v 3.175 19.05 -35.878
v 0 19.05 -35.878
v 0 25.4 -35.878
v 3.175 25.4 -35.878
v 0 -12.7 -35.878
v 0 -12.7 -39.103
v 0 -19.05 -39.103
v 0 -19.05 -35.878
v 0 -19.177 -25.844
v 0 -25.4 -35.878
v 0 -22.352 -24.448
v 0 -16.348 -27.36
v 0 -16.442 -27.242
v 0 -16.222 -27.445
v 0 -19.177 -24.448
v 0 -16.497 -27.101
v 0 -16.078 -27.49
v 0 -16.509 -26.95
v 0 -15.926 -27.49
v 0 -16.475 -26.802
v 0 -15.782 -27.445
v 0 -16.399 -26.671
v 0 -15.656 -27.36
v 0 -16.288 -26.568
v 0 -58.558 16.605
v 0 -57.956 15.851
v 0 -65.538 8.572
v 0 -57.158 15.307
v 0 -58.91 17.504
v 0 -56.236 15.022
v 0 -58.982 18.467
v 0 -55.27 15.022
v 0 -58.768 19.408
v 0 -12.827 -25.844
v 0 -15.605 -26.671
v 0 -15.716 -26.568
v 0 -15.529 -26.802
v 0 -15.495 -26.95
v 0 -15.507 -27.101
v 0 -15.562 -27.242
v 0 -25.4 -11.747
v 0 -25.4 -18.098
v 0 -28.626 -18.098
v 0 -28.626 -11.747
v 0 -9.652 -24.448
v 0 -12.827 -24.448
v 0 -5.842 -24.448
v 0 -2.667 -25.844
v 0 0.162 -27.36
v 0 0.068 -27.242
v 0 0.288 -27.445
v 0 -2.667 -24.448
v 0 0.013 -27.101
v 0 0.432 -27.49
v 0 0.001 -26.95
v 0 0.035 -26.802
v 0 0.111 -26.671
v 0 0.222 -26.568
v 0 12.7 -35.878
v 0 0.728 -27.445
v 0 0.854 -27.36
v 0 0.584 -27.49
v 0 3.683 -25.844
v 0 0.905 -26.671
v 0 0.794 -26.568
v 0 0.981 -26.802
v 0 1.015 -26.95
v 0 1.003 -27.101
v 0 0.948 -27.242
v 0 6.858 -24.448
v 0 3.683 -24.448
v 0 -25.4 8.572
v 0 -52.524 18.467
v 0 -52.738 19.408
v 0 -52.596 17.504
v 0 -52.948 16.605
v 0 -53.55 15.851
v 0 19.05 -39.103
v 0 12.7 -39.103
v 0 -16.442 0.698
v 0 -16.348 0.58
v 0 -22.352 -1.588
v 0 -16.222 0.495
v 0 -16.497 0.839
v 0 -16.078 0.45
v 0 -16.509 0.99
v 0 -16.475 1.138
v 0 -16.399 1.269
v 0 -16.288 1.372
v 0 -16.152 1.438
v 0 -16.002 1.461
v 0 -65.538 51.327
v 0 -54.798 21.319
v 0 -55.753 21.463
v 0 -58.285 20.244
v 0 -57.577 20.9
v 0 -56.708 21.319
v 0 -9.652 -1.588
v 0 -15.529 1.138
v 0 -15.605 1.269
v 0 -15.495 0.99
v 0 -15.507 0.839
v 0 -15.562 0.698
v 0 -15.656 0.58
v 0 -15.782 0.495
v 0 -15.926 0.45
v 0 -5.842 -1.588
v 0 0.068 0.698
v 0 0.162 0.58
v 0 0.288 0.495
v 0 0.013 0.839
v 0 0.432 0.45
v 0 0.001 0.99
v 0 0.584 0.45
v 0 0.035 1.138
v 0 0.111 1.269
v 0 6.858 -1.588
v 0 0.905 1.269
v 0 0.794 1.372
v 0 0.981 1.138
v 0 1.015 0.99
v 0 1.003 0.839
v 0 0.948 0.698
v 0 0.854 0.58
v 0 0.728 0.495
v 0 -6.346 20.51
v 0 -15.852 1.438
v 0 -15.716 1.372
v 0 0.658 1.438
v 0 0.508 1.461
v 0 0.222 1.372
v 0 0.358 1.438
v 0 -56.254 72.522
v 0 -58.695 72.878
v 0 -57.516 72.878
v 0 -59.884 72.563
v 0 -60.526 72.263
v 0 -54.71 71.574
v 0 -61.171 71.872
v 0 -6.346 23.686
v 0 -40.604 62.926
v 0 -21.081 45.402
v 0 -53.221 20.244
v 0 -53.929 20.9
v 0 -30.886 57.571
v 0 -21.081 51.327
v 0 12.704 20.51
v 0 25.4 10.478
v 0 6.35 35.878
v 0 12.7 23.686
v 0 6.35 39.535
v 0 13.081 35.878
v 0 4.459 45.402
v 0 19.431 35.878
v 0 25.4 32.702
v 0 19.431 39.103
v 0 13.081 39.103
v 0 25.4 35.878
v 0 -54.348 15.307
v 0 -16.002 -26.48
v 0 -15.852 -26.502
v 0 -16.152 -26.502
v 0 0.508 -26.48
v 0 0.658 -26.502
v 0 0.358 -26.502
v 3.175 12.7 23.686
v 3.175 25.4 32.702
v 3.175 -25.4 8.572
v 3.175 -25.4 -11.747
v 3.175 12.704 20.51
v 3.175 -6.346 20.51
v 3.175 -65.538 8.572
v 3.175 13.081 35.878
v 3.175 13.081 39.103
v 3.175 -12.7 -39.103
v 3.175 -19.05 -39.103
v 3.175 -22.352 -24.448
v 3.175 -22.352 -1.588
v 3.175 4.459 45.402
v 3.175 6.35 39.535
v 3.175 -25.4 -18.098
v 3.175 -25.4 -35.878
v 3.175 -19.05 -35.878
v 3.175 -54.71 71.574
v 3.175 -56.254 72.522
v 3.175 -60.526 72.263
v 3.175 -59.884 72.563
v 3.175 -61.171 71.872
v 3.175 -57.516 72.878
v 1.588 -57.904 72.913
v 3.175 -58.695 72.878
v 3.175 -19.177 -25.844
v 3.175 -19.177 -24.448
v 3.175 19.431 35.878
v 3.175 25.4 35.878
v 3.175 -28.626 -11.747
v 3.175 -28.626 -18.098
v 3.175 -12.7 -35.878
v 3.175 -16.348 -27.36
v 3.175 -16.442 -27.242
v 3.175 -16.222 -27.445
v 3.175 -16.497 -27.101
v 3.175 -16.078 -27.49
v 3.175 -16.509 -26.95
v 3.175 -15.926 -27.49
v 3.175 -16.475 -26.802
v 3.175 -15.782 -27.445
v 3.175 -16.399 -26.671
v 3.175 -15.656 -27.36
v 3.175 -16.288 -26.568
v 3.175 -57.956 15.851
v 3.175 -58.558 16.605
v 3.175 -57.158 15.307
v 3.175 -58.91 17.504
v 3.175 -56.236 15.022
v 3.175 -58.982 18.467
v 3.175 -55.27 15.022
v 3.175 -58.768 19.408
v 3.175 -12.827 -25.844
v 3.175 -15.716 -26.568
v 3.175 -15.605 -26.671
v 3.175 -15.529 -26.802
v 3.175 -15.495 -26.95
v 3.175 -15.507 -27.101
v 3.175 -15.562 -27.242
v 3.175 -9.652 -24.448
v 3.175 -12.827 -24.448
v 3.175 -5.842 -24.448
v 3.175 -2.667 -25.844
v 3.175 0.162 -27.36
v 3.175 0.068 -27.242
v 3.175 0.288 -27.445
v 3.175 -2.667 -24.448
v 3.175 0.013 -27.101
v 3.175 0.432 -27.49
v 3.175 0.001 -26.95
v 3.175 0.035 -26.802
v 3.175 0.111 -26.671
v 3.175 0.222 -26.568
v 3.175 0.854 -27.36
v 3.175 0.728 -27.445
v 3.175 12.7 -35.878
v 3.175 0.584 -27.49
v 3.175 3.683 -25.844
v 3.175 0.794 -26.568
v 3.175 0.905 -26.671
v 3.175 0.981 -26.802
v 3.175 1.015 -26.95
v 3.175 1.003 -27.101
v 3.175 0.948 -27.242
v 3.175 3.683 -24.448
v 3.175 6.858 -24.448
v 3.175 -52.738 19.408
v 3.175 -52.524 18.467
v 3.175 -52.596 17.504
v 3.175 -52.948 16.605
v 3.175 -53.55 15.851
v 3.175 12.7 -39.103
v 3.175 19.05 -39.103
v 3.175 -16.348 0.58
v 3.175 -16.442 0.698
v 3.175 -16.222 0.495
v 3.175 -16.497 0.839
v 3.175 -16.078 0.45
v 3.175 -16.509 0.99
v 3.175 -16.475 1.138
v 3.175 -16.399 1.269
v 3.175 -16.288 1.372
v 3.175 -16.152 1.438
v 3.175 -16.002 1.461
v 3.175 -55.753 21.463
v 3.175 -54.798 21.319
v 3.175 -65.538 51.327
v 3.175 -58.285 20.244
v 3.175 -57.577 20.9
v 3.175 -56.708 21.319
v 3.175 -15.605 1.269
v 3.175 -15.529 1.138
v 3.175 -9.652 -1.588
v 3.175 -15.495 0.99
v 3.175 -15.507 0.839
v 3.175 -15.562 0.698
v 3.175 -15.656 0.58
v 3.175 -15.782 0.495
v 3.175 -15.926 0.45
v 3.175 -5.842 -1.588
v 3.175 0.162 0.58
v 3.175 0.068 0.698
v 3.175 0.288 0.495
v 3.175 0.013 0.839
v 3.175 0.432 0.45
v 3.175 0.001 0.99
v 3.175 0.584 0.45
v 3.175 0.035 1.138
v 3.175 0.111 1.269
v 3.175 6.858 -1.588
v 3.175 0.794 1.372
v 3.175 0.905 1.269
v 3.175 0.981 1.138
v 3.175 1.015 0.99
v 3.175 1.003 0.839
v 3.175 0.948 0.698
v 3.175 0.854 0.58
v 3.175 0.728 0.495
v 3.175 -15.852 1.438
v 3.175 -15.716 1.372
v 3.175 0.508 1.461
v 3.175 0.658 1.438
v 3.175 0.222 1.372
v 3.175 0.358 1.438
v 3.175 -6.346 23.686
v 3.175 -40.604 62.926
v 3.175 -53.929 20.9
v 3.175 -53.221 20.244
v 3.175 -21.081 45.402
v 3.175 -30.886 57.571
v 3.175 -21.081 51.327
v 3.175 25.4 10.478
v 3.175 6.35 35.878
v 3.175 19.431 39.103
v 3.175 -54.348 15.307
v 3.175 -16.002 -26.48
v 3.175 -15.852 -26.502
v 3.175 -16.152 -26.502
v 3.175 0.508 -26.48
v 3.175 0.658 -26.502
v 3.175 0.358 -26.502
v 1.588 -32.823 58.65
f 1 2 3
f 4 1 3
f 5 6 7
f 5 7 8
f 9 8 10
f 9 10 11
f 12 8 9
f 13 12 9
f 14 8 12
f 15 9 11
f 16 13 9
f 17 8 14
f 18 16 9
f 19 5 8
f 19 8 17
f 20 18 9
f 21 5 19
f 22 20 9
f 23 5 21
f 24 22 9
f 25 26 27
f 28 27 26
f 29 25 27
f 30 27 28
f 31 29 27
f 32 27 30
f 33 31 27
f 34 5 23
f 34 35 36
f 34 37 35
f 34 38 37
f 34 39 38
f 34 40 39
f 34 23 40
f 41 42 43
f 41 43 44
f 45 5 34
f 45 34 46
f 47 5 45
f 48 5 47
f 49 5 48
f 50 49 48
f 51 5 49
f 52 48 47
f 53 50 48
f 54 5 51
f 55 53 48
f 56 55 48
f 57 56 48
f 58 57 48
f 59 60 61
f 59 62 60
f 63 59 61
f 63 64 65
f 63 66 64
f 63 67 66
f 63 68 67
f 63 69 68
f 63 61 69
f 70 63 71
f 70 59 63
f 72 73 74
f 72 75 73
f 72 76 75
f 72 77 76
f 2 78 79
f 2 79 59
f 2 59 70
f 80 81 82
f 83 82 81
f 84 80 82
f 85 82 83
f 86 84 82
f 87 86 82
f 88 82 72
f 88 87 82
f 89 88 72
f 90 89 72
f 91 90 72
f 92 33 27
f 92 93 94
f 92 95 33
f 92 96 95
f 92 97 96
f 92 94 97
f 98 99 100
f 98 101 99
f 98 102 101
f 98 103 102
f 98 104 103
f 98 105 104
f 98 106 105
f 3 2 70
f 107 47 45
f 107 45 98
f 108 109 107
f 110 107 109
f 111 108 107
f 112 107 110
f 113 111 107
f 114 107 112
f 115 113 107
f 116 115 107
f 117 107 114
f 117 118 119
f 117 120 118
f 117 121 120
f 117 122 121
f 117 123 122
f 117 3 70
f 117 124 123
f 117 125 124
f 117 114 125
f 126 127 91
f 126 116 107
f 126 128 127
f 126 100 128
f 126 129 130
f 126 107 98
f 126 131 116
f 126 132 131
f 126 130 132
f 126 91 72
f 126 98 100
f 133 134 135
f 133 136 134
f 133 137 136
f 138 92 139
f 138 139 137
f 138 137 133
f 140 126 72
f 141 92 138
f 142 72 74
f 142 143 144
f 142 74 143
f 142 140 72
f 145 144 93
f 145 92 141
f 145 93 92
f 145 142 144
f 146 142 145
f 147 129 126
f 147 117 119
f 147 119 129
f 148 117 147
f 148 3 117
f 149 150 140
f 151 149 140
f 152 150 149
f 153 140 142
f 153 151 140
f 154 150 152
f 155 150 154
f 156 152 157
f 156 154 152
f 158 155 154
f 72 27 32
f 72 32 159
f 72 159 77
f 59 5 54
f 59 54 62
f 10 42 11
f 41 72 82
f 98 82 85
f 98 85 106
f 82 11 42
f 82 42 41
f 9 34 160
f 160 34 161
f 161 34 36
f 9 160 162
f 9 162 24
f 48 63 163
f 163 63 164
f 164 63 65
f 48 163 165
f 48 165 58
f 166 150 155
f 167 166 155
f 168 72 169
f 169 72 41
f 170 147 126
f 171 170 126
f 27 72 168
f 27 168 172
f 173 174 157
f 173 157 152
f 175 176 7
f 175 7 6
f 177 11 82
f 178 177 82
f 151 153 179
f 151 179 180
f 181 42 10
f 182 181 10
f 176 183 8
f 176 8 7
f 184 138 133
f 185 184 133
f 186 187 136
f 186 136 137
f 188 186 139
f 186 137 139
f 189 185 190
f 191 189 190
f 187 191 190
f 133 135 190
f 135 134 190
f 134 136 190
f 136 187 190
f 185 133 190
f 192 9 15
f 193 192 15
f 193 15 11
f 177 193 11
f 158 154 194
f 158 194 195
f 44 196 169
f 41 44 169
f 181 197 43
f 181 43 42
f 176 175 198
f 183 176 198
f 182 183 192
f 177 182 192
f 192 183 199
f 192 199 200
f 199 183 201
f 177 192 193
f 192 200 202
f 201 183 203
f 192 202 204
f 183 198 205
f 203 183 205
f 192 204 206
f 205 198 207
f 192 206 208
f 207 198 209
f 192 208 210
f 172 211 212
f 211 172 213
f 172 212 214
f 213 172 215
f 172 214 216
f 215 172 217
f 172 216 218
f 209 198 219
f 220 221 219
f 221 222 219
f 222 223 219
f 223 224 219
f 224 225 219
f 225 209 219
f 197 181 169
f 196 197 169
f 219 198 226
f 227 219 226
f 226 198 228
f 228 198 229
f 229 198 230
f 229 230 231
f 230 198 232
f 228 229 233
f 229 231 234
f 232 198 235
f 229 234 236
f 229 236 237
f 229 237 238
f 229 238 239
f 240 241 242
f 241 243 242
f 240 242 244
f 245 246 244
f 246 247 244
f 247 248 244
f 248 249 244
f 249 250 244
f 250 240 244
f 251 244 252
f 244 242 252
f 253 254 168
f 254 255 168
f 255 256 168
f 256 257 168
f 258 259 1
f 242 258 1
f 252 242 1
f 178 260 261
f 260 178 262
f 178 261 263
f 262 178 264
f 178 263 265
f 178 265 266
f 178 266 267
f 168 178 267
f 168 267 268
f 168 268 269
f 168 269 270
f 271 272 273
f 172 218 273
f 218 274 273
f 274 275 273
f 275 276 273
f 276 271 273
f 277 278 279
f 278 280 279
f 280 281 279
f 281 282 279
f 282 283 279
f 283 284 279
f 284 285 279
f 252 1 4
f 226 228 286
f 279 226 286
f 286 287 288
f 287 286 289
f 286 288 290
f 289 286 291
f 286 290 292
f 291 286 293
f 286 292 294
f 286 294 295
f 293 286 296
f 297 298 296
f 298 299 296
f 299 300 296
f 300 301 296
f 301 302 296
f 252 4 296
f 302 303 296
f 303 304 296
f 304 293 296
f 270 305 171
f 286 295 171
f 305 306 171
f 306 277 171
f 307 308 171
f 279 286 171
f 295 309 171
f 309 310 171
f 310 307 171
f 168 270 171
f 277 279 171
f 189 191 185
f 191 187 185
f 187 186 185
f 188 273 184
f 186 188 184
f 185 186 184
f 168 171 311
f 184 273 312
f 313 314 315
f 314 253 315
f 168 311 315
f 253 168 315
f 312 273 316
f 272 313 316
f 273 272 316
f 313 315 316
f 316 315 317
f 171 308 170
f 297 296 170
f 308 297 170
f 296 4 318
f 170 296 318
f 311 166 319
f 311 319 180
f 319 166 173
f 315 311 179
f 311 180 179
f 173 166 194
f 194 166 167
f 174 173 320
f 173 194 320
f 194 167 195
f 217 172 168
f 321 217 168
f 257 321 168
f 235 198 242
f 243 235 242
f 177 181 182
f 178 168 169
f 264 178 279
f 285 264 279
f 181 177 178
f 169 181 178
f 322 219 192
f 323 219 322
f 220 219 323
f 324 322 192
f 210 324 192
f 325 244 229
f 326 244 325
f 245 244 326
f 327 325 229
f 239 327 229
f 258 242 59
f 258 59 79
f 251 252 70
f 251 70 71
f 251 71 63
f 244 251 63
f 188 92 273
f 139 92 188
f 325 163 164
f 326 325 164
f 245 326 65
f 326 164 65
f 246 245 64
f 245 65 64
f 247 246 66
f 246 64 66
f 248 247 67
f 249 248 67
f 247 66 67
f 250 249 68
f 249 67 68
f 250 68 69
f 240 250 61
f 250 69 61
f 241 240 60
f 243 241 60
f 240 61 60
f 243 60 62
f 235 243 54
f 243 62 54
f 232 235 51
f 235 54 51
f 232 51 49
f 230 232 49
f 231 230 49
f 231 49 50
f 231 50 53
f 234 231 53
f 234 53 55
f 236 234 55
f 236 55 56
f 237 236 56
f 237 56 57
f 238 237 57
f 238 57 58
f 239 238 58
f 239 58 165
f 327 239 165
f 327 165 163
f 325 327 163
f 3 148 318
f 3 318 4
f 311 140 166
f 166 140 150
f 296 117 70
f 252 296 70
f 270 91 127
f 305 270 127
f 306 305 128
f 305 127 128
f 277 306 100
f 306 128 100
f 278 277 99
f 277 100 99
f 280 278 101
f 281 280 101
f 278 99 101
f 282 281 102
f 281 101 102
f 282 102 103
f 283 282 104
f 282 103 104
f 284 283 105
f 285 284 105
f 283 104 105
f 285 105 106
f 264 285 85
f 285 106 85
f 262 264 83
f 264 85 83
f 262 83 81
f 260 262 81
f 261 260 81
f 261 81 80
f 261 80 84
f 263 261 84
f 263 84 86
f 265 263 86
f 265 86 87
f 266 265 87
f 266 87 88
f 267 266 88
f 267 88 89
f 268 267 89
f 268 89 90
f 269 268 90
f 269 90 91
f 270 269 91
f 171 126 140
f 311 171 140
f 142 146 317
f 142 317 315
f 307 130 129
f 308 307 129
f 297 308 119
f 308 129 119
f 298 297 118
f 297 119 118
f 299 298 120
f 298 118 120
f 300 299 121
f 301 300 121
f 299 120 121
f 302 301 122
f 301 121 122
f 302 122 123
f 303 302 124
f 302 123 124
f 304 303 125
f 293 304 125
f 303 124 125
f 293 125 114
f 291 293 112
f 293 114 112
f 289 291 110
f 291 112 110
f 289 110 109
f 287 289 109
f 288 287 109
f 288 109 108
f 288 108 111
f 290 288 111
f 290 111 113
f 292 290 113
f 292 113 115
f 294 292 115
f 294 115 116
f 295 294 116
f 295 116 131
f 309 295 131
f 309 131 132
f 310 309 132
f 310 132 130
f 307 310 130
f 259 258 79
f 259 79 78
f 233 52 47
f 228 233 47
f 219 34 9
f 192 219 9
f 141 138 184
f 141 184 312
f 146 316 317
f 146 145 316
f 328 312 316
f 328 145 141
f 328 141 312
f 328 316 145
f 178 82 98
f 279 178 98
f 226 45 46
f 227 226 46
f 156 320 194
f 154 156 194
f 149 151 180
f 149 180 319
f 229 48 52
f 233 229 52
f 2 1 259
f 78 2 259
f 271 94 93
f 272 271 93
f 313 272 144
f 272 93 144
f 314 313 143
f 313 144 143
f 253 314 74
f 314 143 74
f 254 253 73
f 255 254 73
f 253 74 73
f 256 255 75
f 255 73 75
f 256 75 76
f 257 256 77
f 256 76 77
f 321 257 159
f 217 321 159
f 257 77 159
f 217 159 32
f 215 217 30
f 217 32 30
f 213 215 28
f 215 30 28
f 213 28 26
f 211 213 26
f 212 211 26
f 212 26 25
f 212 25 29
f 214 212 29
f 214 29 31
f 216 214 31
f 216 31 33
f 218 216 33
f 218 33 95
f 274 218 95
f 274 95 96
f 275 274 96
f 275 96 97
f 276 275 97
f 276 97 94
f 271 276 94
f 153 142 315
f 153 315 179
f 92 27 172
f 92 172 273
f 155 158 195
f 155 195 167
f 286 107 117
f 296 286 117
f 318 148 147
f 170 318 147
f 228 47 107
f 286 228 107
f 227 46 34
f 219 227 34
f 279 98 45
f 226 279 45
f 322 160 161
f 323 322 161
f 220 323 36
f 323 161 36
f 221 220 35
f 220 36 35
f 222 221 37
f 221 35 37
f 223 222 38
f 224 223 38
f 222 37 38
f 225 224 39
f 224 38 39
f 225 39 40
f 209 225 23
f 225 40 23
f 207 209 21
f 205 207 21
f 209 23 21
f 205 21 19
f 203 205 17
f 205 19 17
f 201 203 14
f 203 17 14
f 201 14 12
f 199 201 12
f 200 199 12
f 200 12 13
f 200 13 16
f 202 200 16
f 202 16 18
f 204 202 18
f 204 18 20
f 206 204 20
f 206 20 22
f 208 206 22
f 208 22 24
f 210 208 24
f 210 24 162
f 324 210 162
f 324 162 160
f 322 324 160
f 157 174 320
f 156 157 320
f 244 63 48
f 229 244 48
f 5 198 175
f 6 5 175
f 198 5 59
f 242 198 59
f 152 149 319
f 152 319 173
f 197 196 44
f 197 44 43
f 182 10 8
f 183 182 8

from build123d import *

# Parameters (mm, degrees)
SKETCH1_W                = 71.755
SKETCH1_H                = 50.8
MAIN_BODY_DEPTH          = 3.175
SKETCH2_W                = 3.2258
SKETCH2_H                = 6.35
SKETCH2_W_2              = 6.35
SKETCH2_H_2              = 3.2258
TABS_DEPTH               = 3.175
NOSE_SECTION_DEPTH       = 3.175
SKETCH8_R                = 0.508
CUT_FOR_MOTORS_DEPTH     = 4.1750001
SLOT_FOR_FIREWALL_DEPTH  = 4.1750001
EXTENSION_FOR_AXLE_DEPTH = 3.175
SKETCH11_R               = 3.2385
CUT_FOR_AXLE_DEPTH       = 4.1750001


with BuildPart() as part:
    # Sketch1 → main body (new body)
    with BuildSketch(Plane(origin=(0, 0, 0), x_dir=(0, 0, -1), z_dir=(1, 0, 0))):
        Rectangle(SKETCH1_W, SKETCH1_H)
    extrude(amount=MAIN_BODY_DEPTH)

    # Sketch2 → tabs (add)
    with BuildSketch(Plane(origin=(3.175, 0, 0), x_dir=(0, 0, -1), z_dir=(1, 0, 0))):
        with Locations((-37.4904, 16.256)):
            Rectangle(SKETCH2_W, SKETCH2_H)
        with Locations((37.4904, 15.875)):
            Rectangle(SKETCH2_W, SKETCH2_H)
        with Locations((37.4904, -15.875)):
            Rectangle(SKETCH2_W, SKETCH2_H)
        with Locations((14.9225, -27.0129)):
            Rectangle(SKETCH2_W_2, SKETCH2_H_2)
    extrude(amount=-TABS_DEPTH)

    # Sketch3 → nose section (add)
    with BuildSketch(Plane.ZY):
        with BuildLine():
            Line((51.326941337, -21.081213956), (45.4025, -21.081213956))
            Line((45.4025, -21.081213956), (45.4025, 4.459215194))
            Line((45.4025, 4.459215194), (39.534554548, 6.35))
            Line((39.534554548, 6.35), (35.8775, 6.35))
            Line((35.8775, 6.35), (35.8775, -25.4))
            Line((35.8775, -25.4), (35.8775, -57.323174337))
            Line((35.8775, -57.323174337), (42.8625, -65.53778801))
            Line((42.8625, -65.53778801), (51.326941337, -65.53778801))
            Line((51.326941337, -65.53778801), (71.872461292, -61.17070293))
            add(Edge.make_bspline(
                [(71.573902629, -54.710271069), (74.102249919, -57.868358167), (71.872461292, -61.17070293)],
                knots=[0, 0, 0, 1, 1, 1], degree=2))
            add(Edge.make_bspline(
                [(71.573902629, -54.710271069), (65.707060229, -46.091929926), (62.410515677, -39.350220463), (53.353361757, -23.389519751), (51.326941337, -21.081213956)],
                knots=[0, 0, 0, 0, 0.673726306, 1, 1, 1, 1], degree=3))
        make_face()
    extrude(amount=-NOSE_SECTION_DEPTH)

    # Sketch8 → cut for motors (cut, through all)
    with BuildSketch(Plane.ZY):
        with Locations((-26.9875, 0.508)):
            Circle(SKETCH8_R)
        with Locations((0.9525, 0.508)):
            Circle(SKETCH8_R)
        with Locations((-26.9875, -16.002)):
            Circle(SKETCH8_R)
        with Locations((0.9525, -16.002)):
            Circle(SKETCH8_R)
        Polygon((-1.5875, -5.842), (-1.5875, 6.858), (-24.4475, 6.858), (-24.4475, 3.683), (-25.8445, 3.683), (-25.8445, -2.667), (-24.4475, -2.667), (-24.4475, -5.842), align=None)
        Polygon((-1.5875, -22.352), (-1.5875, -9.652), (-24.4475, -9.652), (-24.4475, -12.827), (-25.8445, -12.827), (-25.8445, -19.177), (-24.4475, -19.177), (-24.4475, -22.352), align=None)
    extrude(amount=-CUT_FOR_MOTORS_DEPTH, mode=Mode.SUBTRACT)

    # Sketch9 → slot for firewall (cut, through all)
    with BuildSketch(Plane.ZY):
        Polygon((20.5105, -6.34593574), (23.6855, -6.34593574), (23.6855, 12.7), (32.7025, 25.4), (23.1775, 25.4), (20.0025, 25.4), (10.4775, 25.4), (20.5105, 12.70406426), align=None)
    extrude(amount=-SLOT_FOR_FIREWALL_DEPTH, mode=Mode.SUBTRACT)

    # Sketch10 → extension for axle (add)
    with BuildSketch(Plane.ZY):
        Polygon((35.8775, -57.323174337), (35.8775, -25.4), (8.5725, -25.4), (8.5725, -65.53778801), (42.8625, -65.53778801), align=None)
    extrude(amount=-EXTENSION_FOR_AXLE_DEPTH)

    # Sketch11 → cut for axle (cut, through all)
    with BuildSketch(Plane.ZY):
        with Locations((18.2245, -55.753)):
            Circle(SKETCH11_R)
    extrude(amount=-CUT_FOR_AXLE_DEPTH, mode=Mode.SUBTRACT)


solid = part.part
